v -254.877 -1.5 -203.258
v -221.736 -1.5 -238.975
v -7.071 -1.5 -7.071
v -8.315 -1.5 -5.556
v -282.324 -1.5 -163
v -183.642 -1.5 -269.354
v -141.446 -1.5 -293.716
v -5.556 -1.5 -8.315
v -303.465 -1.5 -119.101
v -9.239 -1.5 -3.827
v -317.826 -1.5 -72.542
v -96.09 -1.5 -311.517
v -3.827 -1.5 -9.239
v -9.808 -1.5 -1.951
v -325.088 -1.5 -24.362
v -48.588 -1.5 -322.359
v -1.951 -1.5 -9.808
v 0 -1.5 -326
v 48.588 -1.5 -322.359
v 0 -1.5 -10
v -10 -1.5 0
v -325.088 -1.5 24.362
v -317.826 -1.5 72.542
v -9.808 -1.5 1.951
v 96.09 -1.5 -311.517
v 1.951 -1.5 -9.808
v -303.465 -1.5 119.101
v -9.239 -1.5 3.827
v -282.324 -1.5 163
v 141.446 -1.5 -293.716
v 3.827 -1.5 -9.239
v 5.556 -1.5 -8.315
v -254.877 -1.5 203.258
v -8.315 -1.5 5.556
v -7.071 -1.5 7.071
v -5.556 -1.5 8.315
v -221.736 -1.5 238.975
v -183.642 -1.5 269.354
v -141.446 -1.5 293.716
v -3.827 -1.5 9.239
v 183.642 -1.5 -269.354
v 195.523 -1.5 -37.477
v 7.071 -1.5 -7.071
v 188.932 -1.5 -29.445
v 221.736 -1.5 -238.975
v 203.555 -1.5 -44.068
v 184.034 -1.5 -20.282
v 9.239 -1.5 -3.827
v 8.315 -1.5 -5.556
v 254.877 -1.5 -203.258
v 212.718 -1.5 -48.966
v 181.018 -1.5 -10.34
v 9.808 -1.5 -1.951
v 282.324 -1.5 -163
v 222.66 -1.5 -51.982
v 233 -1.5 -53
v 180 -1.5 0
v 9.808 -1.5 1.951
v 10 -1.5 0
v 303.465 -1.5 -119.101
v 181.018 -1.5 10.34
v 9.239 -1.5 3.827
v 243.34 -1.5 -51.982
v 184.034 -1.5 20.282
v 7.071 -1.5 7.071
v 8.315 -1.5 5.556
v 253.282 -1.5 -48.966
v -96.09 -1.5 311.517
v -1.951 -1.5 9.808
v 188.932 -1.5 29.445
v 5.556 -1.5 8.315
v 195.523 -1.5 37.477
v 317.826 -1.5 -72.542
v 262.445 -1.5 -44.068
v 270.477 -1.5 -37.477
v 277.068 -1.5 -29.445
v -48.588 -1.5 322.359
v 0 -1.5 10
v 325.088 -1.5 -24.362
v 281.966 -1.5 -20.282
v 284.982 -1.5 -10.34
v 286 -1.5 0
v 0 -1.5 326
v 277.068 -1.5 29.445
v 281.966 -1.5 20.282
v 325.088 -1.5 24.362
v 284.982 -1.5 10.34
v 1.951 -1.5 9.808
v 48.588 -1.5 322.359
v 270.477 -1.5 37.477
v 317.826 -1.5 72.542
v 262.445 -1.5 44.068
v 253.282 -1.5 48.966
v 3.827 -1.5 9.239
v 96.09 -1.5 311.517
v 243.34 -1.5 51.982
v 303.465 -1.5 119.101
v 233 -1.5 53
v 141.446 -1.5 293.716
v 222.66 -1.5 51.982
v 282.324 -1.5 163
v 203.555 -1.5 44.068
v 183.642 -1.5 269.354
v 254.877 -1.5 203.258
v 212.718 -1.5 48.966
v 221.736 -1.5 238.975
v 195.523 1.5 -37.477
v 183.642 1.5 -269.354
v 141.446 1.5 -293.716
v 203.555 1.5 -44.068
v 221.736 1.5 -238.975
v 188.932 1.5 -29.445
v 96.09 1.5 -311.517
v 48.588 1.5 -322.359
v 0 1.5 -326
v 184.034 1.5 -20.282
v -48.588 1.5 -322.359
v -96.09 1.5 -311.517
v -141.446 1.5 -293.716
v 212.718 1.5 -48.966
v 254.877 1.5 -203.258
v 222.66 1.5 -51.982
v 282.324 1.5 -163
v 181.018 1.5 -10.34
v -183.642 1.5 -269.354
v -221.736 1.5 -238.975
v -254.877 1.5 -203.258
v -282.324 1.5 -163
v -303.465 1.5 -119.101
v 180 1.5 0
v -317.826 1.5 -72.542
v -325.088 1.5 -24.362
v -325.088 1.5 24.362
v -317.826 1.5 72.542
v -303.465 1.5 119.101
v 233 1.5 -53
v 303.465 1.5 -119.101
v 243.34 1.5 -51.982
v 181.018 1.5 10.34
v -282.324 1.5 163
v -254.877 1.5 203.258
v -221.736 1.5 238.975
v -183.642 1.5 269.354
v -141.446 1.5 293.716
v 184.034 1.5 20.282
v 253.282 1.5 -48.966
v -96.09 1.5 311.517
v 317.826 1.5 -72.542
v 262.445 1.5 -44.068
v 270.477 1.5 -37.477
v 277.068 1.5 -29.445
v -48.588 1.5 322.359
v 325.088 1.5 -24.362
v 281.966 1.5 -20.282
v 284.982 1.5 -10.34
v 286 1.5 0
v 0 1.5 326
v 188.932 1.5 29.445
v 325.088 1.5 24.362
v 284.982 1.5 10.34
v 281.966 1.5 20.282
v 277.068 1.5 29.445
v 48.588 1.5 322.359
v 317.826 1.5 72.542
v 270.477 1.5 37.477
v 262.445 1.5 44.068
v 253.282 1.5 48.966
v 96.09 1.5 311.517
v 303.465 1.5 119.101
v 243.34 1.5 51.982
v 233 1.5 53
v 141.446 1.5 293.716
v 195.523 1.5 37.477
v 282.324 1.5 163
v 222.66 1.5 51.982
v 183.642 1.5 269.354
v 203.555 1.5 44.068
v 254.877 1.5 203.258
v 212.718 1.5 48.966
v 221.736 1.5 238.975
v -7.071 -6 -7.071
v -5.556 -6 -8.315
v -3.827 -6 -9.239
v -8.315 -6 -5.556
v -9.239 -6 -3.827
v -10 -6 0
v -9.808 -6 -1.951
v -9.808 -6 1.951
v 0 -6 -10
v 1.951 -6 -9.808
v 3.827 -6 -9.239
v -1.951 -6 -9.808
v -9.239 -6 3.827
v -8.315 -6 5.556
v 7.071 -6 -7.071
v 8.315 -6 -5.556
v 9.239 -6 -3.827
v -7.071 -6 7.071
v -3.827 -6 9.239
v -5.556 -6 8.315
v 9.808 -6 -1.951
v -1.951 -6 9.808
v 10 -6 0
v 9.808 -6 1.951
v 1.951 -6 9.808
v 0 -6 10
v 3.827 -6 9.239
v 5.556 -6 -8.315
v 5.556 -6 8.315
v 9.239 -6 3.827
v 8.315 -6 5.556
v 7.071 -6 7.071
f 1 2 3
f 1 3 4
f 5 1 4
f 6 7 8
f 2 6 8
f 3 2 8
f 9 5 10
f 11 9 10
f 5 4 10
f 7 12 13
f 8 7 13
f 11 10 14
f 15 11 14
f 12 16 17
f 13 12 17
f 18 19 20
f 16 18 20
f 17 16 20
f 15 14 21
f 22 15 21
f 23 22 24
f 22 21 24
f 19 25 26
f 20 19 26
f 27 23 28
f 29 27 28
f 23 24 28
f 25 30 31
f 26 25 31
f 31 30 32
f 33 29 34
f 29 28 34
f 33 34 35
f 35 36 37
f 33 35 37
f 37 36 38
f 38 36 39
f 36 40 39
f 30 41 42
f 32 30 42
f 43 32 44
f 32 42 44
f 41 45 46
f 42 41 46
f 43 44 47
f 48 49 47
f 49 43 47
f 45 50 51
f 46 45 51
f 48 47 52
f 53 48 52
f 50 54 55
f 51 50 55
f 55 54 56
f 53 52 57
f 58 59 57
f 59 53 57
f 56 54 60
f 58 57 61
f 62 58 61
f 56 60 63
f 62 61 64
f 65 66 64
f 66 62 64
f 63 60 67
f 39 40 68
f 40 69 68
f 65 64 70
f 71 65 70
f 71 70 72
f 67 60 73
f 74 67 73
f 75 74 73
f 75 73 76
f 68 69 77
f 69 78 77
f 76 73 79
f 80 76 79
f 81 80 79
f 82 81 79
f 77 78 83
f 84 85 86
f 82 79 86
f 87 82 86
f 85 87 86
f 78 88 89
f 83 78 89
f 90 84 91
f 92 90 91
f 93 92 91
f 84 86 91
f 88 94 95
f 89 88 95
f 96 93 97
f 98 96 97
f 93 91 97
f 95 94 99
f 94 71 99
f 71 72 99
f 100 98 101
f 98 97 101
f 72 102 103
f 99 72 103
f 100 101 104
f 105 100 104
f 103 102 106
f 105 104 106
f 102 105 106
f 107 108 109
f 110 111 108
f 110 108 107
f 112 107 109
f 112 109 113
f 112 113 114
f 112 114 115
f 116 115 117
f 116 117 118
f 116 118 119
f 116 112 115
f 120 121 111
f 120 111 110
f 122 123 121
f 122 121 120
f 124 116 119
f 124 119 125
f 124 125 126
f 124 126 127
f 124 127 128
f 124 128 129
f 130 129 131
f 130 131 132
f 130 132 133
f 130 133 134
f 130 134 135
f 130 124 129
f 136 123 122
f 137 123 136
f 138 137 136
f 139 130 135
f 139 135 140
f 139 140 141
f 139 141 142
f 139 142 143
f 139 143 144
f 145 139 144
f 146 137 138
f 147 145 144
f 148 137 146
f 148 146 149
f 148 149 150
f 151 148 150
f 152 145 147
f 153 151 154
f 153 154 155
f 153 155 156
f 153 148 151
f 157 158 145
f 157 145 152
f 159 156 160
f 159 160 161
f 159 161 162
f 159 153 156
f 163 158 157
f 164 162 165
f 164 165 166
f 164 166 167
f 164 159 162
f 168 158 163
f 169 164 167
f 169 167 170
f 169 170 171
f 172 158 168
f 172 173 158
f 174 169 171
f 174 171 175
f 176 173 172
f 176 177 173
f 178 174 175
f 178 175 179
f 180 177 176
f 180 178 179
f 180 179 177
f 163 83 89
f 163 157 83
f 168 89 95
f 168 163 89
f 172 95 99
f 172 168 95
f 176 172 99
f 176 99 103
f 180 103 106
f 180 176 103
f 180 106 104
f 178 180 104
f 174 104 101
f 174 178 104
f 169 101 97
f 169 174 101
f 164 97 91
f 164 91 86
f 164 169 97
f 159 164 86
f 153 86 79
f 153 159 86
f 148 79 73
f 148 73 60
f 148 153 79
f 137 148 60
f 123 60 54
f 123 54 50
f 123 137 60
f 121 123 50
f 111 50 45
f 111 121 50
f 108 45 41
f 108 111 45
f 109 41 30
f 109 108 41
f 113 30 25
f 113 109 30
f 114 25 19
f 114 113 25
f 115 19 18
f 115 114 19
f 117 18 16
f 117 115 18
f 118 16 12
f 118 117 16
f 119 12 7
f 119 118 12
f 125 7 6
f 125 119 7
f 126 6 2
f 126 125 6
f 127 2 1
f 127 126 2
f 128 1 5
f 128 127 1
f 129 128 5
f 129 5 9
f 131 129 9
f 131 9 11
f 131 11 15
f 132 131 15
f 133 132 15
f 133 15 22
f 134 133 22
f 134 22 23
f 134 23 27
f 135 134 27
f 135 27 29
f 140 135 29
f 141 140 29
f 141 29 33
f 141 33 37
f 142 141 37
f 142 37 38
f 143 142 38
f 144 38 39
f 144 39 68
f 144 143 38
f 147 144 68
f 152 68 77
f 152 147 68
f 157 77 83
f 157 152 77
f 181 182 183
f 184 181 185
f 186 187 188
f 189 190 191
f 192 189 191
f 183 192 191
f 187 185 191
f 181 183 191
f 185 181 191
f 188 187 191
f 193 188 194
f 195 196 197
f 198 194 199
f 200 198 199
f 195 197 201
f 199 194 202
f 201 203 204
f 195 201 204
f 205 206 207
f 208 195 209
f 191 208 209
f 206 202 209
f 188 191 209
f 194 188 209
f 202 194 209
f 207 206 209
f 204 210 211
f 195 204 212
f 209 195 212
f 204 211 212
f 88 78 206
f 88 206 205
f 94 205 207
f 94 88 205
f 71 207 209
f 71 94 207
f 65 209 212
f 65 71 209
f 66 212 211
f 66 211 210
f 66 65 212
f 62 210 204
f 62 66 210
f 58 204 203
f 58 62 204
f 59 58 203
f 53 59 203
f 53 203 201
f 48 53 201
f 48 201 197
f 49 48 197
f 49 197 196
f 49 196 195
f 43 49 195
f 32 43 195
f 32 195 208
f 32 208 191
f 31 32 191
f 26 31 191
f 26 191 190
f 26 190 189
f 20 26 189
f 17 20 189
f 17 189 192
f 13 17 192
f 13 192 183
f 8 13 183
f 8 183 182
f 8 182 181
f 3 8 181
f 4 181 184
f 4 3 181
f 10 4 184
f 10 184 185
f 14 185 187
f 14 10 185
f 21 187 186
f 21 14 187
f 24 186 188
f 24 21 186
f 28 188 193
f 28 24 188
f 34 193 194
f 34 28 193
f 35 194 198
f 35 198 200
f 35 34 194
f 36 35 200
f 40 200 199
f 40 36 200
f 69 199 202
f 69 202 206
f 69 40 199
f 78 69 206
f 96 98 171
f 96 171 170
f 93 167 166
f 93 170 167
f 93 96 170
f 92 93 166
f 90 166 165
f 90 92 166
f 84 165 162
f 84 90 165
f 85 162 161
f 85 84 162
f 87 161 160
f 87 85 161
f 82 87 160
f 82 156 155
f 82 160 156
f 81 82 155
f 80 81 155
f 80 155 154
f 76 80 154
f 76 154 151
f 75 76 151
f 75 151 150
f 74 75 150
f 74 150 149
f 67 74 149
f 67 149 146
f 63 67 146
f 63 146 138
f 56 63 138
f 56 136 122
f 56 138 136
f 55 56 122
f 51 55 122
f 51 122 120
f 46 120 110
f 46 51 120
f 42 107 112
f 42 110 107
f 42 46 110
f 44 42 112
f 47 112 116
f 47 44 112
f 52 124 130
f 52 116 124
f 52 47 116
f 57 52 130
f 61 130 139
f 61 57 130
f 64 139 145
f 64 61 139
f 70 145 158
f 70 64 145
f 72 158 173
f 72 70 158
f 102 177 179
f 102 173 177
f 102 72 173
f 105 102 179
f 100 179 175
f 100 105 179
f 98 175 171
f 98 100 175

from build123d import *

# Parameters (mm, degrees)
SKETCH_1_R               = 326
EXTRUDE_1_DEPTH          = 1.5
SKETCH_3_R               = 10
EXTRUDE_2_DEPTH          = 6
CUT_EXTRUDE_1_DEPTH      = 462.072662386
CUT_EXTRUDE_1_DEPTH_BACK = 462.072662386
SKETCH_4_R               = 53


with BuildPart() as part:
    # 草图1 → 凸台-拉伸1 (new, symmetric)
    with BuildSketch(Plane(origin=(0, 0, 0), x_dir=(1, 0, 0), z_dir=(0, 1, 0))):
        with Locations(Location((0, 0, 0), (0, 0, 270))):
            Circle(SKETCH_1_R)
    extrude(amount=EXTRUDE_1_DEPTH, both=True)

    # 草图3 → 凸台-拉伸2 (add)
    with BuildSketch(Plane(origin=(0, 0, 0), x_dir=(1, 0, 0), z_dir=(0, 1, 0))):
        with Locations(Location((0, 0, 0), (0, 0, 270))):
            Circle(SKETCH_3_R)
    extrude(amount=-EXTRUDE_2_DEPTH)

    # 草图4 → 切除-拉伸1 (cut, two sides: drawn at the far end of the back side and taken through both)
    with BuildSketch(Plane(origin=(0, 0, 0), x_dir=(1, 0, 0), z_dir=(0, 1, 0)).offset(-CUT_EXTRUDE_1_DEPTH_BACK)):
        with Locations(Location((233, 0, 0), (0, 0, 270))):
            Circle(SKETCH_4_R)
    extrude(amount=CUT_EXTRUDE_1_DEPTH + CUT_EXTRUDE_1_DEPTH_BACK, mode=Mode.SUBTRACT)


solid = part.part
